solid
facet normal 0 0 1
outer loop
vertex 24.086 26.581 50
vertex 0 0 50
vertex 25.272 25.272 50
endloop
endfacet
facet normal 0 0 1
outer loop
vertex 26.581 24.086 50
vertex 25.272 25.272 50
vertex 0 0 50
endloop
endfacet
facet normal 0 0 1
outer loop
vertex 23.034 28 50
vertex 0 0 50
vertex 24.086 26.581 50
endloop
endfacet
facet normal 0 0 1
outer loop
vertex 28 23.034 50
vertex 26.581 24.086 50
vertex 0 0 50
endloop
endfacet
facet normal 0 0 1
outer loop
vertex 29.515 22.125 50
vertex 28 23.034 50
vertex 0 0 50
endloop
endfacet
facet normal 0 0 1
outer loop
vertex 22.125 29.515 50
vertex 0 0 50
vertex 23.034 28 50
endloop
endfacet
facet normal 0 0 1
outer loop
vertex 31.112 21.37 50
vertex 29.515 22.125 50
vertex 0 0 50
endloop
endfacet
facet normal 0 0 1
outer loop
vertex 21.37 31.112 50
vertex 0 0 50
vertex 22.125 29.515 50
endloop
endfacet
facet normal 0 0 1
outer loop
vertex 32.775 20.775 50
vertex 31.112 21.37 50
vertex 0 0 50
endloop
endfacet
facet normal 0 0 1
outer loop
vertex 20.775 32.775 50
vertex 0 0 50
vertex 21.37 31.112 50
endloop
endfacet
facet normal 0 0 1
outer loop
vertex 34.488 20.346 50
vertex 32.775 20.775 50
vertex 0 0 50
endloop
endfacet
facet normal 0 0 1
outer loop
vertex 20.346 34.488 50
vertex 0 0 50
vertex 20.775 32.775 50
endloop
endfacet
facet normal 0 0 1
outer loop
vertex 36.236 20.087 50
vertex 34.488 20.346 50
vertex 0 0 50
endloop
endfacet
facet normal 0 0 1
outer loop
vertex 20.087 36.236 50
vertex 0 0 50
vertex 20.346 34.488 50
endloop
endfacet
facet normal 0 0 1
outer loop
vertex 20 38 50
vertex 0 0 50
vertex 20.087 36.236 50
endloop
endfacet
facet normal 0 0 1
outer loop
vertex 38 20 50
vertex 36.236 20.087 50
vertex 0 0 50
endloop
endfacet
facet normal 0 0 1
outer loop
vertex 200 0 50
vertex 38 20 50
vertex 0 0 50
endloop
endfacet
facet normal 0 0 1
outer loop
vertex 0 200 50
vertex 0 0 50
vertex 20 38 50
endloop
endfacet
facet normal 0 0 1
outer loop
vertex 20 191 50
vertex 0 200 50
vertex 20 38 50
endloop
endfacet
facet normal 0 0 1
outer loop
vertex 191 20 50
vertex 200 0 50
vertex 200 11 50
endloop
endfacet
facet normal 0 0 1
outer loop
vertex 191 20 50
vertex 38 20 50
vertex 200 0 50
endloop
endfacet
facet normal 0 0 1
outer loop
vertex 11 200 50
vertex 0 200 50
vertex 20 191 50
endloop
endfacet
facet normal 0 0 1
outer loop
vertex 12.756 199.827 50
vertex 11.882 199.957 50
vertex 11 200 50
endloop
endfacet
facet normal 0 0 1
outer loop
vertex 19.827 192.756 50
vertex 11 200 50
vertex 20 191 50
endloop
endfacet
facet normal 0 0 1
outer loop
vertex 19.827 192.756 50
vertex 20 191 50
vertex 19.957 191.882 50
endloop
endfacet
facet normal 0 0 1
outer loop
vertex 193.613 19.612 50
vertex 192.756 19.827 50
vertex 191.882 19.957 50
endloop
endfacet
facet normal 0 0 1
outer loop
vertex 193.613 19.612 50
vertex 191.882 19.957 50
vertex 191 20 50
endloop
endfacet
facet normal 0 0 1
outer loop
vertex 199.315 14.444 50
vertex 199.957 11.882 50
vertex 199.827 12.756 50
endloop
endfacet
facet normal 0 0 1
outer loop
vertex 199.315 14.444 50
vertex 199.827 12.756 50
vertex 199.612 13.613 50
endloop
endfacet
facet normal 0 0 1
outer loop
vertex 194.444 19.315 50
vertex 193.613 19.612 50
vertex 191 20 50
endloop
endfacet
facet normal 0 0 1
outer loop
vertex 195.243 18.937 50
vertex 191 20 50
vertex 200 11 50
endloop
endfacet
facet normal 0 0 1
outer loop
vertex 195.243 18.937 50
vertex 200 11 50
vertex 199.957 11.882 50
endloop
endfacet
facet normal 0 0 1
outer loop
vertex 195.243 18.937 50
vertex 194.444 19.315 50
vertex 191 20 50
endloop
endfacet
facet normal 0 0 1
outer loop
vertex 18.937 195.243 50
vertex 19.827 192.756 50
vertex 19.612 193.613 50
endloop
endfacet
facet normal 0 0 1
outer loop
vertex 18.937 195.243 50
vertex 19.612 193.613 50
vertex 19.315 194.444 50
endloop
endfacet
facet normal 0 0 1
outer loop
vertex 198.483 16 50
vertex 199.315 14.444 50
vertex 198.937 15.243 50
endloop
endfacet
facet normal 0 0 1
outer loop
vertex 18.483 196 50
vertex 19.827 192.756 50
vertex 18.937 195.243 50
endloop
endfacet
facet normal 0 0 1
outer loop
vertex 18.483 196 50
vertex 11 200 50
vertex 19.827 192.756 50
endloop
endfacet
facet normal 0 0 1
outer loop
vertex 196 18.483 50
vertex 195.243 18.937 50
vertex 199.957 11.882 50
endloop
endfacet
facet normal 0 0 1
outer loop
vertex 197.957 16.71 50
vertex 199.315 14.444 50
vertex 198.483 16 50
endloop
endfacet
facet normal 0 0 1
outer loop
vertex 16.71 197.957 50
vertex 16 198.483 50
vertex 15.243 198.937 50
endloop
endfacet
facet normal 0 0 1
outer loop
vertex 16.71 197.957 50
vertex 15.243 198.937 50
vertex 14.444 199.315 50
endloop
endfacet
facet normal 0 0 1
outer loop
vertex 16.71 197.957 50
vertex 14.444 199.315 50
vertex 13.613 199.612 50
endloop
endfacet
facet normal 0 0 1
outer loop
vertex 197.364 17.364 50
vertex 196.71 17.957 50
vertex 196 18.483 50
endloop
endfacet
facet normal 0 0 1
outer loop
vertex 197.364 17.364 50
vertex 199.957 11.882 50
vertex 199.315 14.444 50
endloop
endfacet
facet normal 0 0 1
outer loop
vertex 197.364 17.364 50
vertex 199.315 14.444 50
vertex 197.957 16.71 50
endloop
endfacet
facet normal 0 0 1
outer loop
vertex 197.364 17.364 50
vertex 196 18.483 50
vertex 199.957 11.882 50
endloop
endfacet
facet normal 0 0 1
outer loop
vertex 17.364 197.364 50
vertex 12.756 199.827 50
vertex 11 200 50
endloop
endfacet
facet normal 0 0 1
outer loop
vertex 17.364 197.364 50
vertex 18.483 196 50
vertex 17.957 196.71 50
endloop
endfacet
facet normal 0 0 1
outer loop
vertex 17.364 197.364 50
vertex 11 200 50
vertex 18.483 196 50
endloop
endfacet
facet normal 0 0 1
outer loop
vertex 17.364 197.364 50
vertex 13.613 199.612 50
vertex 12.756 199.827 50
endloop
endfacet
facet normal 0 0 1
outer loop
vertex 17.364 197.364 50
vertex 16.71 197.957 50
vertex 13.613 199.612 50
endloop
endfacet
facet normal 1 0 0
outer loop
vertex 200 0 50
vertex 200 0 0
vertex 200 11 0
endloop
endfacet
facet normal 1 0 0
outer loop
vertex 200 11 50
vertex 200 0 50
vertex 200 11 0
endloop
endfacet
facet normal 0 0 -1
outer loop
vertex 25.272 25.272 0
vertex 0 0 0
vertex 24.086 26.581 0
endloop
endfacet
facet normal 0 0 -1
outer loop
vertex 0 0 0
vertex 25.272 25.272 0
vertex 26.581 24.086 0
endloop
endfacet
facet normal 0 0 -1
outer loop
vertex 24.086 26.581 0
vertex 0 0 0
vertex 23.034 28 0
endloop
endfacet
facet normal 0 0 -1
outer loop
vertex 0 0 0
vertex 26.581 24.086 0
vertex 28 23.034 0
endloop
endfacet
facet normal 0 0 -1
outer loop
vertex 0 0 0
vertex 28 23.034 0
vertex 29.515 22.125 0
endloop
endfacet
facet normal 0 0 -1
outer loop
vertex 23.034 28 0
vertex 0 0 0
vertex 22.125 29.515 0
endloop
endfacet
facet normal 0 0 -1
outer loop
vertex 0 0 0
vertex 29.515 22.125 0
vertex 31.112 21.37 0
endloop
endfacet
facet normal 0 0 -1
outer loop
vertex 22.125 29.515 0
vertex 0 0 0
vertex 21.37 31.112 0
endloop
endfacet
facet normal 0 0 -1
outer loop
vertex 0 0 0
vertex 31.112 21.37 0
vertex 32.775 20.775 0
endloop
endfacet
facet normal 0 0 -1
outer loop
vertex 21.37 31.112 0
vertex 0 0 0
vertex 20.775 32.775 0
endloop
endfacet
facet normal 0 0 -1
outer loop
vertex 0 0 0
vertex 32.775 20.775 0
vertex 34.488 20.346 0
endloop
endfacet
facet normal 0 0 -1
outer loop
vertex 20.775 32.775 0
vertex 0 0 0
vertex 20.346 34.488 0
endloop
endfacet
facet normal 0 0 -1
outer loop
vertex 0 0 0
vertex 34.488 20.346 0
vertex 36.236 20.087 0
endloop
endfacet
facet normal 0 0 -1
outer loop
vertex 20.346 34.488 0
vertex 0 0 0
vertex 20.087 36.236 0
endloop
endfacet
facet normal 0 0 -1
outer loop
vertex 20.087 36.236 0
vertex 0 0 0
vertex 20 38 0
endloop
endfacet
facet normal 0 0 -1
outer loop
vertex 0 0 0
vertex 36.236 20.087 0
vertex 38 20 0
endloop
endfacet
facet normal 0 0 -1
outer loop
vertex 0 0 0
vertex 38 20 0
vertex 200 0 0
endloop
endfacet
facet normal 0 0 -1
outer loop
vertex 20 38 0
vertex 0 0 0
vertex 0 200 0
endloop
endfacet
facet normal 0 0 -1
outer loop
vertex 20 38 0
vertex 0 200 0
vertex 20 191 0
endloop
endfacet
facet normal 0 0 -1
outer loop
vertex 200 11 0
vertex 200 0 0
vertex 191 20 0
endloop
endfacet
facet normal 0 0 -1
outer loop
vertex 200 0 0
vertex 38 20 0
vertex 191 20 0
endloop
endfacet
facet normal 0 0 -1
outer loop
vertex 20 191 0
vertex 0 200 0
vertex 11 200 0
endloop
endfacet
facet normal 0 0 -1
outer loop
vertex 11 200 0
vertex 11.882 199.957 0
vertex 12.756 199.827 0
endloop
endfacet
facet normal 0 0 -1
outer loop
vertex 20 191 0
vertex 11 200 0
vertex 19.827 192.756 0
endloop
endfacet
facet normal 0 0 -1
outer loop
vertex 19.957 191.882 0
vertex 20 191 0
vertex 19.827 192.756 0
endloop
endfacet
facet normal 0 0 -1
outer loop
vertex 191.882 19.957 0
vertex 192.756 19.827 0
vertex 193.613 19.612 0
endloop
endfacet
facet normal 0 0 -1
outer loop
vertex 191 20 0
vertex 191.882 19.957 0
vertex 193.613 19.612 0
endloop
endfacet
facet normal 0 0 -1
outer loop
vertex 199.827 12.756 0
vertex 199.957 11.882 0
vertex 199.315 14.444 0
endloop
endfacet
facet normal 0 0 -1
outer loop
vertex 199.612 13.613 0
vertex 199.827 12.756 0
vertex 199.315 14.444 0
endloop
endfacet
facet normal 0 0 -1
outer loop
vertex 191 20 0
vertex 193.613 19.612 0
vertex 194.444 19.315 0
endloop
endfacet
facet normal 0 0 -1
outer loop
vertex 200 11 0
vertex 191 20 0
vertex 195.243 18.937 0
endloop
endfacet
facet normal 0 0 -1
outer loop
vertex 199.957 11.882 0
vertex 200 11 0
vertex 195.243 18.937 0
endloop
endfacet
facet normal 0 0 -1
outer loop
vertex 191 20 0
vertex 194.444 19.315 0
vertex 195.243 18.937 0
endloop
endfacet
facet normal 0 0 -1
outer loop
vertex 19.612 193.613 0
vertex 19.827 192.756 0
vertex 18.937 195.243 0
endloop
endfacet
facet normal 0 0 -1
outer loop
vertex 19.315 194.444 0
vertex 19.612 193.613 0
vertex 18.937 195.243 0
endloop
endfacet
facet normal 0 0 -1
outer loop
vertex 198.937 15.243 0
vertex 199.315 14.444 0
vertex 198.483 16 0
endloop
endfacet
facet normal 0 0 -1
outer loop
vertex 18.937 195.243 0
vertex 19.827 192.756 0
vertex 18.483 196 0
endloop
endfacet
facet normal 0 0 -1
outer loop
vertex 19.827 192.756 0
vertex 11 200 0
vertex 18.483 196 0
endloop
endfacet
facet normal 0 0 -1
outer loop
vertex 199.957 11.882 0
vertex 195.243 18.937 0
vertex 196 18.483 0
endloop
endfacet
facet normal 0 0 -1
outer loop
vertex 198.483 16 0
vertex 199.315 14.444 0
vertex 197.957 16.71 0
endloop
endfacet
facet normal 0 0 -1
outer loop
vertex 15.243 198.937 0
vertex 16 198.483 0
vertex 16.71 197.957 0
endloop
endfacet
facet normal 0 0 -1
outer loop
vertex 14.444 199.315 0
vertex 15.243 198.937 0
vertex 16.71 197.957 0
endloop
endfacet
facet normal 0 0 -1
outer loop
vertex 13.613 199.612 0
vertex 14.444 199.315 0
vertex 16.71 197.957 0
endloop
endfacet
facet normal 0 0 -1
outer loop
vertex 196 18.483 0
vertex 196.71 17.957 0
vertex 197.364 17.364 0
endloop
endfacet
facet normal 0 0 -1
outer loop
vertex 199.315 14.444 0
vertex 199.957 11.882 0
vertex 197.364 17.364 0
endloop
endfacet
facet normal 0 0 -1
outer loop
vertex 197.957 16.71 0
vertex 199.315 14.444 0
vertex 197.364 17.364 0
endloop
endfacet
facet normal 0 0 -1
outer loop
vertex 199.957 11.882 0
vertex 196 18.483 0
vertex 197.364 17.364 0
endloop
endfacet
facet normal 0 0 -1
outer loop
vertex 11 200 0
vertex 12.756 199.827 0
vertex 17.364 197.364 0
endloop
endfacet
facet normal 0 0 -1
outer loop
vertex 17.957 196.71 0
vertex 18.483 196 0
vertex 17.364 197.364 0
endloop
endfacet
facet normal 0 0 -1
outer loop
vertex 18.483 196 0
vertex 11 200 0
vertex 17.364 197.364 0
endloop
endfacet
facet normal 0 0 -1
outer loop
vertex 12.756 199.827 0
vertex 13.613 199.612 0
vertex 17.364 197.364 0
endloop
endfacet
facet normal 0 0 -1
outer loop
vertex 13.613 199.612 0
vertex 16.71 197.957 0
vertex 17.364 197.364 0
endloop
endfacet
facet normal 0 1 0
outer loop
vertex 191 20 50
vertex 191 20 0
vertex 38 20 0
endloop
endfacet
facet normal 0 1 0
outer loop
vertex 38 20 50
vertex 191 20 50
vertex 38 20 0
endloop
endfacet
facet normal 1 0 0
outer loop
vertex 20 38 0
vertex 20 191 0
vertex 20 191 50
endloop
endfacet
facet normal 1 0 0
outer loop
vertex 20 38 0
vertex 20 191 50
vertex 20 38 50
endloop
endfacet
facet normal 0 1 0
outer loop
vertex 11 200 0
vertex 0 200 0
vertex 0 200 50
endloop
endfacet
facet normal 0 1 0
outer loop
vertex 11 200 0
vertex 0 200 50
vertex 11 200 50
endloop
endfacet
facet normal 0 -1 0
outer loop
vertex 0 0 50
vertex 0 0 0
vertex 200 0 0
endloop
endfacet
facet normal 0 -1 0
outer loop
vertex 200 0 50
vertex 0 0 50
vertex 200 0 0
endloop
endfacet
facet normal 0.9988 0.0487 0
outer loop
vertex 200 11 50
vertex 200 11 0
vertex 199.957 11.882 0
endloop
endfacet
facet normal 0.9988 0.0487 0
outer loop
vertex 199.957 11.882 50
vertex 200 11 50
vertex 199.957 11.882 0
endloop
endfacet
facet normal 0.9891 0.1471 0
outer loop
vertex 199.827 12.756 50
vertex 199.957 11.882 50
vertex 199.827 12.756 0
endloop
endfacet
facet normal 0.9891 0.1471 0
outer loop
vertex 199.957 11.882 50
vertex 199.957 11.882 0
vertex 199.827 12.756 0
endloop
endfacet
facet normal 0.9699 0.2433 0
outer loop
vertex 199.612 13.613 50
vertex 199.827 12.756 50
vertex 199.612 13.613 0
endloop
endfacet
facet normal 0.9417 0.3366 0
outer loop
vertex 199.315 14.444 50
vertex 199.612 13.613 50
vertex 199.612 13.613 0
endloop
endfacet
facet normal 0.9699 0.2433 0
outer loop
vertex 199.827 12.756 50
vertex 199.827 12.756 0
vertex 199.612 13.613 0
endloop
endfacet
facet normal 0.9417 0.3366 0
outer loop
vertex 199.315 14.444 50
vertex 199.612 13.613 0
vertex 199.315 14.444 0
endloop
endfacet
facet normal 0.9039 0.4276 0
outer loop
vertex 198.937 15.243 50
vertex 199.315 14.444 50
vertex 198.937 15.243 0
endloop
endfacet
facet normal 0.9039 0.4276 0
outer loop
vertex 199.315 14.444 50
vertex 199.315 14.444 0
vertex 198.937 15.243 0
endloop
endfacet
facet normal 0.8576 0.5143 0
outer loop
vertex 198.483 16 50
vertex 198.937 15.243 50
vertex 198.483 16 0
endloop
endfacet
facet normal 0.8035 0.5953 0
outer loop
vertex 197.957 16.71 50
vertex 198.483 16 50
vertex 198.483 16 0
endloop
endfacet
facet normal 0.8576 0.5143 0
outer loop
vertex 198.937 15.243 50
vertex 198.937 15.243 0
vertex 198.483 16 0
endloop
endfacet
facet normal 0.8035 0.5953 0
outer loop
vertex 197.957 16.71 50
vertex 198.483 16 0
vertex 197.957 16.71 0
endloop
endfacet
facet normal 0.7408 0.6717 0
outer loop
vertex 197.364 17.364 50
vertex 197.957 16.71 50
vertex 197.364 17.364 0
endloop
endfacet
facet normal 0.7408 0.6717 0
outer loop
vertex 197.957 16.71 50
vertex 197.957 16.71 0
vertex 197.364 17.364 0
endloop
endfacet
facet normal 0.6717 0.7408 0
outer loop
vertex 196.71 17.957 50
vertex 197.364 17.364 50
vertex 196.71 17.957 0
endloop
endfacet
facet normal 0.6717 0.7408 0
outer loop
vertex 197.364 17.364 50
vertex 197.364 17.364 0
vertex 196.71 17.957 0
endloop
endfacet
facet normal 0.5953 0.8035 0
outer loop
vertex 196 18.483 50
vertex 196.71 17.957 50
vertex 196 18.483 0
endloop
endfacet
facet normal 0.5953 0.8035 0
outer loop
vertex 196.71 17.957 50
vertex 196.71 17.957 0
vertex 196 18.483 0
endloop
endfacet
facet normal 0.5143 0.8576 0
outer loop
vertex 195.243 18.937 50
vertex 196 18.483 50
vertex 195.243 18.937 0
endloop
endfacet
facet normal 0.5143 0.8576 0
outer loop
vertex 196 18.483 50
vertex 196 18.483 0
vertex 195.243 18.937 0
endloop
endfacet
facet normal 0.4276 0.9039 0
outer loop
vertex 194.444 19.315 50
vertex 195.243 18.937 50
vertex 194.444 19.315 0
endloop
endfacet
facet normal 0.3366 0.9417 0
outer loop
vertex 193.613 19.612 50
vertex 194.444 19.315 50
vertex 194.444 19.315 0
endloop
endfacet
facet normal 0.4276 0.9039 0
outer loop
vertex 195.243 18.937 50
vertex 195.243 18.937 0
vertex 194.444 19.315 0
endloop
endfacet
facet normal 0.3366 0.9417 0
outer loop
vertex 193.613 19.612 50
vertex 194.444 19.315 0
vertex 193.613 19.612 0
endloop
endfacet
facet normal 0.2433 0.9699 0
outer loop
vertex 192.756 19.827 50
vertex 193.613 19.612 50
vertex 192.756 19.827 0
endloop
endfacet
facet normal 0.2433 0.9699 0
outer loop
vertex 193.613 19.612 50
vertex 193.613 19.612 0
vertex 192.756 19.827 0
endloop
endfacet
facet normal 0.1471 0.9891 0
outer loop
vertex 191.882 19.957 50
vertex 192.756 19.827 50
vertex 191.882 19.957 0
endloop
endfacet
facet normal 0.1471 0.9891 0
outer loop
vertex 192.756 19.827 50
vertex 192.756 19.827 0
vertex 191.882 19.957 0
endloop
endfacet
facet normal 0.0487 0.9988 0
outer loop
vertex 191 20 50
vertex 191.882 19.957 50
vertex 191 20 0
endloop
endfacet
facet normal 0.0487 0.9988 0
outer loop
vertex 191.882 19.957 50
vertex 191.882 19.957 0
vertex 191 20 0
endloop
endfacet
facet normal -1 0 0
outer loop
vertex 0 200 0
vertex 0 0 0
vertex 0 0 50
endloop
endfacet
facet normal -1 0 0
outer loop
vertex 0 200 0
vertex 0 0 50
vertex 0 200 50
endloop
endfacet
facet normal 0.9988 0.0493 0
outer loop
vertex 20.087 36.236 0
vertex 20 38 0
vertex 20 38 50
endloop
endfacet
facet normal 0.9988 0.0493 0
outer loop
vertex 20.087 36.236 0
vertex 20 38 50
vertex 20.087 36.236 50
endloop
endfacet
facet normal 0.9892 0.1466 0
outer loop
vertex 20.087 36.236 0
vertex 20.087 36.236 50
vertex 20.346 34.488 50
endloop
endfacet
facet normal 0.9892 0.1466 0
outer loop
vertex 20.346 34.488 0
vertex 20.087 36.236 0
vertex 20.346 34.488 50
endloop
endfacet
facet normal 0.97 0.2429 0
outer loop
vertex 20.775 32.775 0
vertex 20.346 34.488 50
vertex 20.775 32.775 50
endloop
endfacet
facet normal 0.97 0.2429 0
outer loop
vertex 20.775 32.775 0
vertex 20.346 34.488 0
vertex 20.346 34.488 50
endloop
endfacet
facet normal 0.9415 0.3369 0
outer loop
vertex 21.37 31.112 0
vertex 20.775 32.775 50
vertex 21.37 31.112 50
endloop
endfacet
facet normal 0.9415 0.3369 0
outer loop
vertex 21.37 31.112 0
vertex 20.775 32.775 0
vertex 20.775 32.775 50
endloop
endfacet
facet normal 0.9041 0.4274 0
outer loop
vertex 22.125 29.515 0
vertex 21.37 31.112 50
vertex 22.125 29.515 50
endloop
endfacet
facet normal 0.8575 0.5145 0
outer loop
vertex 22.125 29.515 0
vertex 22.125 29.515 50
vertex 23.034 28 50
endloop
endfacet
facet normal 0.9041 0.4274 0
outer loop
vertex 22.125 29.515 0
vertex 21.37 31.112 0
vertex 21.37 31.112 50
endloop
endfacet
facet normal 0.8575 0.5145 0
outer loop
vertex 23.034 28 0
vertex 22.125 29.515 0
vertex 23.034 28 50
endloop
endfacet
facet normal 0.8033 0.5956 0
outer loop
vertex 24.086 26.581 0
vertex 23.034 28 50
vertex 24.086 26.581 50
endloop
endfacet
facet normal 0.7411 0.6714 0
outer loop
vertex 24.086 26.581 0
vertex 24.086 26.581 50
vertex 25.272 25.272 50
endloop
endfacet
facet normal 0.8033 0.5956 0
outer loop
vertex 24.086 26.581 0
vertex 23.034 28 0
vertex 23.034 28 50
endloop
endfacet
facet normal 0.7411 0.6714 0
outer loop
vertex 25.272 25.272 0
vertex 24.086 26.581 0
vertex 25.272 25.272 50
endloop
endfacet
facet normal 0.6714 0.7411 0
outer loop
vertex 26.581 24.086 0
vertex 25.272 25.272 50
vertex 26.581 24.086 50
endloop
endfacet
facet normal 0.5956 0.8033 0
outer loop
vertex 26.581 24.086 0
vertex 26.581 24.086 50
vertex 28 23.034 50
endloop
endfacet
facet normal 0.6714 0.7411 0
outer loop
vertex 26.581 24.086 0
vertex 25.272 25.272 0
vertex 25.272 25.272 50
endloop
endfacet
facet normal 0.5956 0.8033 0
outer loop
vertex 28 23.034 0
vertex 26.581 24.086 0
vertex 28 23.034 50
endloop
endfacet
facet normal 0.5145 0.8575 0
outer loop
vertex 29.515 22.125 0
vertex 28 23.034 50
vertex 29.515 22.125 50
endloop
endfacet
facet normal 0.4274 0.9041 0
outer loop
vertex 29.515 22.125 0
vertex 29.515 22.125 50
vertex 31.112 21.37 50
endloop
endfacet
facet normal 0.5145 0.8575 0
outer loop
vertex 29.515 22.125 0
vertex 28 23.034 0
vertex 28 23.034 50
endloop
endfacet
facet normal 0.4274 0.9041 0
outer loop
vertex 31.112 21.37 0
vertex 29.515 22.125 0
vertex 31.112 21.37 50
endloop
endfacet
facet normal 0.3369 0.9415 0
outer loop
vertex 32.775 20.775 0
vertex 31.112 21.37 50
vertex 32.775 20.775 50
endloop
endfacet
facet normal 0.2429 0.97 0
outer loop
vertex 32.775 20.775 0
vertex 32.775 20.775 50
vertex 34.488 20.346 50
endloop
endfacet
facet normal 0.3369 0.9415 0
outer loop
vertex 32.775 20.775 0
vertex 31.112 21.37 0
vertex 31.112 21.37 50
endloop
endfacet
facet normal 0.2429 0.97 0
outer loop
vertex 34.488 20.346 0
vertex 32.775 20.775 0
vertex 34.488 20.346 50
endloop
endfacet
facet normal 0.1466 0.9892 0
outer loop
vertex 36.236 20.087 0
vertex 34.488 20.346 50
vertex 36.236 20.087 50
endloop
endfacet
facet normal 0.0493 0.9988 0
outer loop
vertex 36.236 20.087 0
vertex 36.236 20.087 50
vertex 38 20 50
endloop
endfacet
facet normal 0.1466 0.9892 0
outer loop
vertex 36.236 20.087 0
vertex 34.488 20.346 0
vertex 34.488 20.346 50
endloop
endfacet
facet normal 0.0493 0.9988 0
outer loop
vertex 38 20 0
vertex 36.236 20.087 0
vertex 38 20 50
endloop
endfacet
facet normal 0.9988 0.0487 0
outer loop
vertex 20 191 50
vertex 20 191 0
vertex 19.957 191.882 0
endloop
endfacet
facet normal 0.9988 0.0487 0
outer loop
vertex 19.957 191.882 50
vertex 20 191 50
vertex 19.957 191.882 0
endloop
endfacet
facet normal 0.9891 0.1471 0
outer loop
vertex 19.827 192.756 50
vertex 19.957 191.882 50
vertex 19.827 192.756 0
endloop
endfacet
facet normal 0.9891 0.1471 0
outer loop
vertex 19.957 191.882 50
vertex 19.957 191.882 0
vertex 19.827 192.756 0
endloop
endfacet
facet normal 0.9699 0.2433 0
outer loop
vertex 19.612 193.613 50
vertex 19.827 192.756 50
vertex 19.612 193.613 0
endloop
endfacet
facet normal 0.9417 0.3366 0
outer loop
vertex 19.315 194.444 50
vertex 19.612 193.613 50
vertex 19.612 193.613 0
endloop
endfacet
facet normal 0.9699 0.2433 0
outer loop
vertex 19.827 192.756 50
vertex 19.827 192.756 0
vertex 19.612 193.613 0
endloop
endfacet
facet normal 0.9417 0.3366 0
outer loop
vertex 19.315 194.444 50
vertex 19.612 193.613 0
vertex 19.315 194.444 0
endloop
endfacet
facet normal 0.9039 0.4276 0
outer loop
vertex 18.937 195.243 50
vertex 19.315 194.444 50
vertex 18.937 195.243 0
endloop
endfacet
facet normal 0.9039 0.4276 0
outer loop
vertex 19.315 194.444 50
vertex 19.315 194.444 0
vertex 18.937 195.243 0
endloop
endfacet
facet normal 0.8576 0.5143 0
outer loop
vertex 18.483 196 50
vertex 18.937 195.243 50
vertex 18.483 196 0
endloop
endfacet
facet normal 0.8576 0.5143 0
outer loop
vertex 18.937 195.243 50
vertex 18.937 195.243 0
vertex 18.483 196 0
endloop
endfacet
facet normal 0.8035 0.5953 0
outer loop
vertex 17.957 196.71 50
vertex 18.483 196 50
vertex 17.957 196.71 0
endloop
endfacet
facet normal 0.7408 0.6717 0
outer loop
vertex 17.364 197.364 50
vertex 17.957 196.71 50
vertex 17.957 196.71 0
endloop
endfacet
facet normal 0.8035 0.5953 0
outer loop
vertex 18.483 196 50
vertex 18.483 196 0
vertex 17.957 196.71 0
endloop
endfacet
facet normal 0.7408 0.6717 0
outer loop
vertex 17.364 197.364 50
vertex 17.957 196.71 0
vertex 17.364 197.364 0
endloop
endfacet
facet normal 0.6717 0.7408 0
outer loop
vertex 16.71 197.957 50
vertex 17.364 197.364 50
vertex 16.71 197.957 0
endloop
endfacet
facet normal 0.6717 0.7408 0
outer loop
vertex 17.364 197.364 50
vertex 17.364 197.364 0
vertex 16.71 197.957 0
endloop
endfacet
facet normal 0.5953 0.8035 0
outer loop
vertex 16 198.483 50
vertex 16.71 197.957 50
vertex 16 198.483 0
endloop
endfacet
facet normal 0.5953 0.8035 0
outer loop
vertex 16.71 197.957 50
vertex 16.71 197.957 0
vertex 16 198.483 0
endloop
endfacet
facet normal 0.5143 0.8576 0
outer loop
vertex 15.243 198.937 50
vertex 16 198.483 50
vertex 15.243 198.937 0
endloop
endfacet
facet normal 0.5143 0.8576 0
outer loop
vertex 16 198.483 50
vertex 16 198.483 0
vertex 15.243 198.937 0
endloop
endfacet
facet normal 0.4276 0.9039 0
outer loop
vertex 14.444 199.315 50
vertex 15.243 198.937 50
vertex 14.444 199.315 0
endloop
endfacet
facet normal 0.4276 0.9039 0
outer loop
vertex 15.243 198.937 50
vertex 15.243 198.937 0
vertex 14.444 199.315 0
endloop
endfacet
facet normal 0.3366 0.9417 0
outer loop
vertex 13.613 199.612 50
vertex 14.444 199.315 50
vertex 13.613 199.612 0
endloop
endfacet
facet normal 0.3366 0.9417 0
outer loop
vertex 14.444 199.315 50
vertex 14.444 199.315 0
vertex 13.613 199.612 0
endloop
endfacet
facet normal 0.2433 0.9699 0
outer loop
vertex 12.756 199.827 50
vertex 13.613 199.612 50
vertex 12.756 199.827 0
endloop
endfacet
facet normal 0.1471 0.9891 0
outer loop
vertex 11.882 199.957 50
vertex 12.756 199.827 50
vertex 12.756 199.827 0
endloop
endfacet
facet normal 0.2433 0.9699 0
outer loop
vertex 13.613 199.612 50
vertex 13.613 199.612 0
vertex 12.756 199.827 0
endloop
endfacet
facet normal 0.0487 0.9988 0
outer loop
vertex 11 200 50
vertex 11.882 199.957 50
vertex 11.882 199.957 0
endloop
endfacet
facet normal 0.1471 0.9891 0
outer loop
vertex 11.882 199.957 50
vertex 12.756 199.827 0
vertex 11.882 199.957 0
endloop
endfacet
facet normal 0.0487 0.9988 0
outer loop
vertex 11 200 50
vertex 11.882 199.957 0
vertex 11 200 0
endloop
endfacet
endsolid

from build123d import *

# Parameters (mm, degrees)
EXTRUDE_DEPTH = 50


with BuildPart() as part:
    # Sketch → Extrude (new body)
    with BuildSketch(Plane.XY):
        with BuildLine():
            Line((0, 0), (200, 0))
            Line((200, 0), (200, 11))
            ThreePointArc((200, 11), (197.363961, 17.363961), (191, 20))
            Line((191, 20), (38, 20))
            ThreePointArc((20, 38), (25.272078, 25.272078), (38, 20))
            Line((20, 191), (20, 38))
            ThreePointArc((20, 191), (17.363961, 197.363961), (11, 200))
            Line((0, 200), (11, 200))
            Line((0, 0), (0, 200))
        make_face()
    extrude(amount=EXTRUDE_DEPTH)


solid = part.part
